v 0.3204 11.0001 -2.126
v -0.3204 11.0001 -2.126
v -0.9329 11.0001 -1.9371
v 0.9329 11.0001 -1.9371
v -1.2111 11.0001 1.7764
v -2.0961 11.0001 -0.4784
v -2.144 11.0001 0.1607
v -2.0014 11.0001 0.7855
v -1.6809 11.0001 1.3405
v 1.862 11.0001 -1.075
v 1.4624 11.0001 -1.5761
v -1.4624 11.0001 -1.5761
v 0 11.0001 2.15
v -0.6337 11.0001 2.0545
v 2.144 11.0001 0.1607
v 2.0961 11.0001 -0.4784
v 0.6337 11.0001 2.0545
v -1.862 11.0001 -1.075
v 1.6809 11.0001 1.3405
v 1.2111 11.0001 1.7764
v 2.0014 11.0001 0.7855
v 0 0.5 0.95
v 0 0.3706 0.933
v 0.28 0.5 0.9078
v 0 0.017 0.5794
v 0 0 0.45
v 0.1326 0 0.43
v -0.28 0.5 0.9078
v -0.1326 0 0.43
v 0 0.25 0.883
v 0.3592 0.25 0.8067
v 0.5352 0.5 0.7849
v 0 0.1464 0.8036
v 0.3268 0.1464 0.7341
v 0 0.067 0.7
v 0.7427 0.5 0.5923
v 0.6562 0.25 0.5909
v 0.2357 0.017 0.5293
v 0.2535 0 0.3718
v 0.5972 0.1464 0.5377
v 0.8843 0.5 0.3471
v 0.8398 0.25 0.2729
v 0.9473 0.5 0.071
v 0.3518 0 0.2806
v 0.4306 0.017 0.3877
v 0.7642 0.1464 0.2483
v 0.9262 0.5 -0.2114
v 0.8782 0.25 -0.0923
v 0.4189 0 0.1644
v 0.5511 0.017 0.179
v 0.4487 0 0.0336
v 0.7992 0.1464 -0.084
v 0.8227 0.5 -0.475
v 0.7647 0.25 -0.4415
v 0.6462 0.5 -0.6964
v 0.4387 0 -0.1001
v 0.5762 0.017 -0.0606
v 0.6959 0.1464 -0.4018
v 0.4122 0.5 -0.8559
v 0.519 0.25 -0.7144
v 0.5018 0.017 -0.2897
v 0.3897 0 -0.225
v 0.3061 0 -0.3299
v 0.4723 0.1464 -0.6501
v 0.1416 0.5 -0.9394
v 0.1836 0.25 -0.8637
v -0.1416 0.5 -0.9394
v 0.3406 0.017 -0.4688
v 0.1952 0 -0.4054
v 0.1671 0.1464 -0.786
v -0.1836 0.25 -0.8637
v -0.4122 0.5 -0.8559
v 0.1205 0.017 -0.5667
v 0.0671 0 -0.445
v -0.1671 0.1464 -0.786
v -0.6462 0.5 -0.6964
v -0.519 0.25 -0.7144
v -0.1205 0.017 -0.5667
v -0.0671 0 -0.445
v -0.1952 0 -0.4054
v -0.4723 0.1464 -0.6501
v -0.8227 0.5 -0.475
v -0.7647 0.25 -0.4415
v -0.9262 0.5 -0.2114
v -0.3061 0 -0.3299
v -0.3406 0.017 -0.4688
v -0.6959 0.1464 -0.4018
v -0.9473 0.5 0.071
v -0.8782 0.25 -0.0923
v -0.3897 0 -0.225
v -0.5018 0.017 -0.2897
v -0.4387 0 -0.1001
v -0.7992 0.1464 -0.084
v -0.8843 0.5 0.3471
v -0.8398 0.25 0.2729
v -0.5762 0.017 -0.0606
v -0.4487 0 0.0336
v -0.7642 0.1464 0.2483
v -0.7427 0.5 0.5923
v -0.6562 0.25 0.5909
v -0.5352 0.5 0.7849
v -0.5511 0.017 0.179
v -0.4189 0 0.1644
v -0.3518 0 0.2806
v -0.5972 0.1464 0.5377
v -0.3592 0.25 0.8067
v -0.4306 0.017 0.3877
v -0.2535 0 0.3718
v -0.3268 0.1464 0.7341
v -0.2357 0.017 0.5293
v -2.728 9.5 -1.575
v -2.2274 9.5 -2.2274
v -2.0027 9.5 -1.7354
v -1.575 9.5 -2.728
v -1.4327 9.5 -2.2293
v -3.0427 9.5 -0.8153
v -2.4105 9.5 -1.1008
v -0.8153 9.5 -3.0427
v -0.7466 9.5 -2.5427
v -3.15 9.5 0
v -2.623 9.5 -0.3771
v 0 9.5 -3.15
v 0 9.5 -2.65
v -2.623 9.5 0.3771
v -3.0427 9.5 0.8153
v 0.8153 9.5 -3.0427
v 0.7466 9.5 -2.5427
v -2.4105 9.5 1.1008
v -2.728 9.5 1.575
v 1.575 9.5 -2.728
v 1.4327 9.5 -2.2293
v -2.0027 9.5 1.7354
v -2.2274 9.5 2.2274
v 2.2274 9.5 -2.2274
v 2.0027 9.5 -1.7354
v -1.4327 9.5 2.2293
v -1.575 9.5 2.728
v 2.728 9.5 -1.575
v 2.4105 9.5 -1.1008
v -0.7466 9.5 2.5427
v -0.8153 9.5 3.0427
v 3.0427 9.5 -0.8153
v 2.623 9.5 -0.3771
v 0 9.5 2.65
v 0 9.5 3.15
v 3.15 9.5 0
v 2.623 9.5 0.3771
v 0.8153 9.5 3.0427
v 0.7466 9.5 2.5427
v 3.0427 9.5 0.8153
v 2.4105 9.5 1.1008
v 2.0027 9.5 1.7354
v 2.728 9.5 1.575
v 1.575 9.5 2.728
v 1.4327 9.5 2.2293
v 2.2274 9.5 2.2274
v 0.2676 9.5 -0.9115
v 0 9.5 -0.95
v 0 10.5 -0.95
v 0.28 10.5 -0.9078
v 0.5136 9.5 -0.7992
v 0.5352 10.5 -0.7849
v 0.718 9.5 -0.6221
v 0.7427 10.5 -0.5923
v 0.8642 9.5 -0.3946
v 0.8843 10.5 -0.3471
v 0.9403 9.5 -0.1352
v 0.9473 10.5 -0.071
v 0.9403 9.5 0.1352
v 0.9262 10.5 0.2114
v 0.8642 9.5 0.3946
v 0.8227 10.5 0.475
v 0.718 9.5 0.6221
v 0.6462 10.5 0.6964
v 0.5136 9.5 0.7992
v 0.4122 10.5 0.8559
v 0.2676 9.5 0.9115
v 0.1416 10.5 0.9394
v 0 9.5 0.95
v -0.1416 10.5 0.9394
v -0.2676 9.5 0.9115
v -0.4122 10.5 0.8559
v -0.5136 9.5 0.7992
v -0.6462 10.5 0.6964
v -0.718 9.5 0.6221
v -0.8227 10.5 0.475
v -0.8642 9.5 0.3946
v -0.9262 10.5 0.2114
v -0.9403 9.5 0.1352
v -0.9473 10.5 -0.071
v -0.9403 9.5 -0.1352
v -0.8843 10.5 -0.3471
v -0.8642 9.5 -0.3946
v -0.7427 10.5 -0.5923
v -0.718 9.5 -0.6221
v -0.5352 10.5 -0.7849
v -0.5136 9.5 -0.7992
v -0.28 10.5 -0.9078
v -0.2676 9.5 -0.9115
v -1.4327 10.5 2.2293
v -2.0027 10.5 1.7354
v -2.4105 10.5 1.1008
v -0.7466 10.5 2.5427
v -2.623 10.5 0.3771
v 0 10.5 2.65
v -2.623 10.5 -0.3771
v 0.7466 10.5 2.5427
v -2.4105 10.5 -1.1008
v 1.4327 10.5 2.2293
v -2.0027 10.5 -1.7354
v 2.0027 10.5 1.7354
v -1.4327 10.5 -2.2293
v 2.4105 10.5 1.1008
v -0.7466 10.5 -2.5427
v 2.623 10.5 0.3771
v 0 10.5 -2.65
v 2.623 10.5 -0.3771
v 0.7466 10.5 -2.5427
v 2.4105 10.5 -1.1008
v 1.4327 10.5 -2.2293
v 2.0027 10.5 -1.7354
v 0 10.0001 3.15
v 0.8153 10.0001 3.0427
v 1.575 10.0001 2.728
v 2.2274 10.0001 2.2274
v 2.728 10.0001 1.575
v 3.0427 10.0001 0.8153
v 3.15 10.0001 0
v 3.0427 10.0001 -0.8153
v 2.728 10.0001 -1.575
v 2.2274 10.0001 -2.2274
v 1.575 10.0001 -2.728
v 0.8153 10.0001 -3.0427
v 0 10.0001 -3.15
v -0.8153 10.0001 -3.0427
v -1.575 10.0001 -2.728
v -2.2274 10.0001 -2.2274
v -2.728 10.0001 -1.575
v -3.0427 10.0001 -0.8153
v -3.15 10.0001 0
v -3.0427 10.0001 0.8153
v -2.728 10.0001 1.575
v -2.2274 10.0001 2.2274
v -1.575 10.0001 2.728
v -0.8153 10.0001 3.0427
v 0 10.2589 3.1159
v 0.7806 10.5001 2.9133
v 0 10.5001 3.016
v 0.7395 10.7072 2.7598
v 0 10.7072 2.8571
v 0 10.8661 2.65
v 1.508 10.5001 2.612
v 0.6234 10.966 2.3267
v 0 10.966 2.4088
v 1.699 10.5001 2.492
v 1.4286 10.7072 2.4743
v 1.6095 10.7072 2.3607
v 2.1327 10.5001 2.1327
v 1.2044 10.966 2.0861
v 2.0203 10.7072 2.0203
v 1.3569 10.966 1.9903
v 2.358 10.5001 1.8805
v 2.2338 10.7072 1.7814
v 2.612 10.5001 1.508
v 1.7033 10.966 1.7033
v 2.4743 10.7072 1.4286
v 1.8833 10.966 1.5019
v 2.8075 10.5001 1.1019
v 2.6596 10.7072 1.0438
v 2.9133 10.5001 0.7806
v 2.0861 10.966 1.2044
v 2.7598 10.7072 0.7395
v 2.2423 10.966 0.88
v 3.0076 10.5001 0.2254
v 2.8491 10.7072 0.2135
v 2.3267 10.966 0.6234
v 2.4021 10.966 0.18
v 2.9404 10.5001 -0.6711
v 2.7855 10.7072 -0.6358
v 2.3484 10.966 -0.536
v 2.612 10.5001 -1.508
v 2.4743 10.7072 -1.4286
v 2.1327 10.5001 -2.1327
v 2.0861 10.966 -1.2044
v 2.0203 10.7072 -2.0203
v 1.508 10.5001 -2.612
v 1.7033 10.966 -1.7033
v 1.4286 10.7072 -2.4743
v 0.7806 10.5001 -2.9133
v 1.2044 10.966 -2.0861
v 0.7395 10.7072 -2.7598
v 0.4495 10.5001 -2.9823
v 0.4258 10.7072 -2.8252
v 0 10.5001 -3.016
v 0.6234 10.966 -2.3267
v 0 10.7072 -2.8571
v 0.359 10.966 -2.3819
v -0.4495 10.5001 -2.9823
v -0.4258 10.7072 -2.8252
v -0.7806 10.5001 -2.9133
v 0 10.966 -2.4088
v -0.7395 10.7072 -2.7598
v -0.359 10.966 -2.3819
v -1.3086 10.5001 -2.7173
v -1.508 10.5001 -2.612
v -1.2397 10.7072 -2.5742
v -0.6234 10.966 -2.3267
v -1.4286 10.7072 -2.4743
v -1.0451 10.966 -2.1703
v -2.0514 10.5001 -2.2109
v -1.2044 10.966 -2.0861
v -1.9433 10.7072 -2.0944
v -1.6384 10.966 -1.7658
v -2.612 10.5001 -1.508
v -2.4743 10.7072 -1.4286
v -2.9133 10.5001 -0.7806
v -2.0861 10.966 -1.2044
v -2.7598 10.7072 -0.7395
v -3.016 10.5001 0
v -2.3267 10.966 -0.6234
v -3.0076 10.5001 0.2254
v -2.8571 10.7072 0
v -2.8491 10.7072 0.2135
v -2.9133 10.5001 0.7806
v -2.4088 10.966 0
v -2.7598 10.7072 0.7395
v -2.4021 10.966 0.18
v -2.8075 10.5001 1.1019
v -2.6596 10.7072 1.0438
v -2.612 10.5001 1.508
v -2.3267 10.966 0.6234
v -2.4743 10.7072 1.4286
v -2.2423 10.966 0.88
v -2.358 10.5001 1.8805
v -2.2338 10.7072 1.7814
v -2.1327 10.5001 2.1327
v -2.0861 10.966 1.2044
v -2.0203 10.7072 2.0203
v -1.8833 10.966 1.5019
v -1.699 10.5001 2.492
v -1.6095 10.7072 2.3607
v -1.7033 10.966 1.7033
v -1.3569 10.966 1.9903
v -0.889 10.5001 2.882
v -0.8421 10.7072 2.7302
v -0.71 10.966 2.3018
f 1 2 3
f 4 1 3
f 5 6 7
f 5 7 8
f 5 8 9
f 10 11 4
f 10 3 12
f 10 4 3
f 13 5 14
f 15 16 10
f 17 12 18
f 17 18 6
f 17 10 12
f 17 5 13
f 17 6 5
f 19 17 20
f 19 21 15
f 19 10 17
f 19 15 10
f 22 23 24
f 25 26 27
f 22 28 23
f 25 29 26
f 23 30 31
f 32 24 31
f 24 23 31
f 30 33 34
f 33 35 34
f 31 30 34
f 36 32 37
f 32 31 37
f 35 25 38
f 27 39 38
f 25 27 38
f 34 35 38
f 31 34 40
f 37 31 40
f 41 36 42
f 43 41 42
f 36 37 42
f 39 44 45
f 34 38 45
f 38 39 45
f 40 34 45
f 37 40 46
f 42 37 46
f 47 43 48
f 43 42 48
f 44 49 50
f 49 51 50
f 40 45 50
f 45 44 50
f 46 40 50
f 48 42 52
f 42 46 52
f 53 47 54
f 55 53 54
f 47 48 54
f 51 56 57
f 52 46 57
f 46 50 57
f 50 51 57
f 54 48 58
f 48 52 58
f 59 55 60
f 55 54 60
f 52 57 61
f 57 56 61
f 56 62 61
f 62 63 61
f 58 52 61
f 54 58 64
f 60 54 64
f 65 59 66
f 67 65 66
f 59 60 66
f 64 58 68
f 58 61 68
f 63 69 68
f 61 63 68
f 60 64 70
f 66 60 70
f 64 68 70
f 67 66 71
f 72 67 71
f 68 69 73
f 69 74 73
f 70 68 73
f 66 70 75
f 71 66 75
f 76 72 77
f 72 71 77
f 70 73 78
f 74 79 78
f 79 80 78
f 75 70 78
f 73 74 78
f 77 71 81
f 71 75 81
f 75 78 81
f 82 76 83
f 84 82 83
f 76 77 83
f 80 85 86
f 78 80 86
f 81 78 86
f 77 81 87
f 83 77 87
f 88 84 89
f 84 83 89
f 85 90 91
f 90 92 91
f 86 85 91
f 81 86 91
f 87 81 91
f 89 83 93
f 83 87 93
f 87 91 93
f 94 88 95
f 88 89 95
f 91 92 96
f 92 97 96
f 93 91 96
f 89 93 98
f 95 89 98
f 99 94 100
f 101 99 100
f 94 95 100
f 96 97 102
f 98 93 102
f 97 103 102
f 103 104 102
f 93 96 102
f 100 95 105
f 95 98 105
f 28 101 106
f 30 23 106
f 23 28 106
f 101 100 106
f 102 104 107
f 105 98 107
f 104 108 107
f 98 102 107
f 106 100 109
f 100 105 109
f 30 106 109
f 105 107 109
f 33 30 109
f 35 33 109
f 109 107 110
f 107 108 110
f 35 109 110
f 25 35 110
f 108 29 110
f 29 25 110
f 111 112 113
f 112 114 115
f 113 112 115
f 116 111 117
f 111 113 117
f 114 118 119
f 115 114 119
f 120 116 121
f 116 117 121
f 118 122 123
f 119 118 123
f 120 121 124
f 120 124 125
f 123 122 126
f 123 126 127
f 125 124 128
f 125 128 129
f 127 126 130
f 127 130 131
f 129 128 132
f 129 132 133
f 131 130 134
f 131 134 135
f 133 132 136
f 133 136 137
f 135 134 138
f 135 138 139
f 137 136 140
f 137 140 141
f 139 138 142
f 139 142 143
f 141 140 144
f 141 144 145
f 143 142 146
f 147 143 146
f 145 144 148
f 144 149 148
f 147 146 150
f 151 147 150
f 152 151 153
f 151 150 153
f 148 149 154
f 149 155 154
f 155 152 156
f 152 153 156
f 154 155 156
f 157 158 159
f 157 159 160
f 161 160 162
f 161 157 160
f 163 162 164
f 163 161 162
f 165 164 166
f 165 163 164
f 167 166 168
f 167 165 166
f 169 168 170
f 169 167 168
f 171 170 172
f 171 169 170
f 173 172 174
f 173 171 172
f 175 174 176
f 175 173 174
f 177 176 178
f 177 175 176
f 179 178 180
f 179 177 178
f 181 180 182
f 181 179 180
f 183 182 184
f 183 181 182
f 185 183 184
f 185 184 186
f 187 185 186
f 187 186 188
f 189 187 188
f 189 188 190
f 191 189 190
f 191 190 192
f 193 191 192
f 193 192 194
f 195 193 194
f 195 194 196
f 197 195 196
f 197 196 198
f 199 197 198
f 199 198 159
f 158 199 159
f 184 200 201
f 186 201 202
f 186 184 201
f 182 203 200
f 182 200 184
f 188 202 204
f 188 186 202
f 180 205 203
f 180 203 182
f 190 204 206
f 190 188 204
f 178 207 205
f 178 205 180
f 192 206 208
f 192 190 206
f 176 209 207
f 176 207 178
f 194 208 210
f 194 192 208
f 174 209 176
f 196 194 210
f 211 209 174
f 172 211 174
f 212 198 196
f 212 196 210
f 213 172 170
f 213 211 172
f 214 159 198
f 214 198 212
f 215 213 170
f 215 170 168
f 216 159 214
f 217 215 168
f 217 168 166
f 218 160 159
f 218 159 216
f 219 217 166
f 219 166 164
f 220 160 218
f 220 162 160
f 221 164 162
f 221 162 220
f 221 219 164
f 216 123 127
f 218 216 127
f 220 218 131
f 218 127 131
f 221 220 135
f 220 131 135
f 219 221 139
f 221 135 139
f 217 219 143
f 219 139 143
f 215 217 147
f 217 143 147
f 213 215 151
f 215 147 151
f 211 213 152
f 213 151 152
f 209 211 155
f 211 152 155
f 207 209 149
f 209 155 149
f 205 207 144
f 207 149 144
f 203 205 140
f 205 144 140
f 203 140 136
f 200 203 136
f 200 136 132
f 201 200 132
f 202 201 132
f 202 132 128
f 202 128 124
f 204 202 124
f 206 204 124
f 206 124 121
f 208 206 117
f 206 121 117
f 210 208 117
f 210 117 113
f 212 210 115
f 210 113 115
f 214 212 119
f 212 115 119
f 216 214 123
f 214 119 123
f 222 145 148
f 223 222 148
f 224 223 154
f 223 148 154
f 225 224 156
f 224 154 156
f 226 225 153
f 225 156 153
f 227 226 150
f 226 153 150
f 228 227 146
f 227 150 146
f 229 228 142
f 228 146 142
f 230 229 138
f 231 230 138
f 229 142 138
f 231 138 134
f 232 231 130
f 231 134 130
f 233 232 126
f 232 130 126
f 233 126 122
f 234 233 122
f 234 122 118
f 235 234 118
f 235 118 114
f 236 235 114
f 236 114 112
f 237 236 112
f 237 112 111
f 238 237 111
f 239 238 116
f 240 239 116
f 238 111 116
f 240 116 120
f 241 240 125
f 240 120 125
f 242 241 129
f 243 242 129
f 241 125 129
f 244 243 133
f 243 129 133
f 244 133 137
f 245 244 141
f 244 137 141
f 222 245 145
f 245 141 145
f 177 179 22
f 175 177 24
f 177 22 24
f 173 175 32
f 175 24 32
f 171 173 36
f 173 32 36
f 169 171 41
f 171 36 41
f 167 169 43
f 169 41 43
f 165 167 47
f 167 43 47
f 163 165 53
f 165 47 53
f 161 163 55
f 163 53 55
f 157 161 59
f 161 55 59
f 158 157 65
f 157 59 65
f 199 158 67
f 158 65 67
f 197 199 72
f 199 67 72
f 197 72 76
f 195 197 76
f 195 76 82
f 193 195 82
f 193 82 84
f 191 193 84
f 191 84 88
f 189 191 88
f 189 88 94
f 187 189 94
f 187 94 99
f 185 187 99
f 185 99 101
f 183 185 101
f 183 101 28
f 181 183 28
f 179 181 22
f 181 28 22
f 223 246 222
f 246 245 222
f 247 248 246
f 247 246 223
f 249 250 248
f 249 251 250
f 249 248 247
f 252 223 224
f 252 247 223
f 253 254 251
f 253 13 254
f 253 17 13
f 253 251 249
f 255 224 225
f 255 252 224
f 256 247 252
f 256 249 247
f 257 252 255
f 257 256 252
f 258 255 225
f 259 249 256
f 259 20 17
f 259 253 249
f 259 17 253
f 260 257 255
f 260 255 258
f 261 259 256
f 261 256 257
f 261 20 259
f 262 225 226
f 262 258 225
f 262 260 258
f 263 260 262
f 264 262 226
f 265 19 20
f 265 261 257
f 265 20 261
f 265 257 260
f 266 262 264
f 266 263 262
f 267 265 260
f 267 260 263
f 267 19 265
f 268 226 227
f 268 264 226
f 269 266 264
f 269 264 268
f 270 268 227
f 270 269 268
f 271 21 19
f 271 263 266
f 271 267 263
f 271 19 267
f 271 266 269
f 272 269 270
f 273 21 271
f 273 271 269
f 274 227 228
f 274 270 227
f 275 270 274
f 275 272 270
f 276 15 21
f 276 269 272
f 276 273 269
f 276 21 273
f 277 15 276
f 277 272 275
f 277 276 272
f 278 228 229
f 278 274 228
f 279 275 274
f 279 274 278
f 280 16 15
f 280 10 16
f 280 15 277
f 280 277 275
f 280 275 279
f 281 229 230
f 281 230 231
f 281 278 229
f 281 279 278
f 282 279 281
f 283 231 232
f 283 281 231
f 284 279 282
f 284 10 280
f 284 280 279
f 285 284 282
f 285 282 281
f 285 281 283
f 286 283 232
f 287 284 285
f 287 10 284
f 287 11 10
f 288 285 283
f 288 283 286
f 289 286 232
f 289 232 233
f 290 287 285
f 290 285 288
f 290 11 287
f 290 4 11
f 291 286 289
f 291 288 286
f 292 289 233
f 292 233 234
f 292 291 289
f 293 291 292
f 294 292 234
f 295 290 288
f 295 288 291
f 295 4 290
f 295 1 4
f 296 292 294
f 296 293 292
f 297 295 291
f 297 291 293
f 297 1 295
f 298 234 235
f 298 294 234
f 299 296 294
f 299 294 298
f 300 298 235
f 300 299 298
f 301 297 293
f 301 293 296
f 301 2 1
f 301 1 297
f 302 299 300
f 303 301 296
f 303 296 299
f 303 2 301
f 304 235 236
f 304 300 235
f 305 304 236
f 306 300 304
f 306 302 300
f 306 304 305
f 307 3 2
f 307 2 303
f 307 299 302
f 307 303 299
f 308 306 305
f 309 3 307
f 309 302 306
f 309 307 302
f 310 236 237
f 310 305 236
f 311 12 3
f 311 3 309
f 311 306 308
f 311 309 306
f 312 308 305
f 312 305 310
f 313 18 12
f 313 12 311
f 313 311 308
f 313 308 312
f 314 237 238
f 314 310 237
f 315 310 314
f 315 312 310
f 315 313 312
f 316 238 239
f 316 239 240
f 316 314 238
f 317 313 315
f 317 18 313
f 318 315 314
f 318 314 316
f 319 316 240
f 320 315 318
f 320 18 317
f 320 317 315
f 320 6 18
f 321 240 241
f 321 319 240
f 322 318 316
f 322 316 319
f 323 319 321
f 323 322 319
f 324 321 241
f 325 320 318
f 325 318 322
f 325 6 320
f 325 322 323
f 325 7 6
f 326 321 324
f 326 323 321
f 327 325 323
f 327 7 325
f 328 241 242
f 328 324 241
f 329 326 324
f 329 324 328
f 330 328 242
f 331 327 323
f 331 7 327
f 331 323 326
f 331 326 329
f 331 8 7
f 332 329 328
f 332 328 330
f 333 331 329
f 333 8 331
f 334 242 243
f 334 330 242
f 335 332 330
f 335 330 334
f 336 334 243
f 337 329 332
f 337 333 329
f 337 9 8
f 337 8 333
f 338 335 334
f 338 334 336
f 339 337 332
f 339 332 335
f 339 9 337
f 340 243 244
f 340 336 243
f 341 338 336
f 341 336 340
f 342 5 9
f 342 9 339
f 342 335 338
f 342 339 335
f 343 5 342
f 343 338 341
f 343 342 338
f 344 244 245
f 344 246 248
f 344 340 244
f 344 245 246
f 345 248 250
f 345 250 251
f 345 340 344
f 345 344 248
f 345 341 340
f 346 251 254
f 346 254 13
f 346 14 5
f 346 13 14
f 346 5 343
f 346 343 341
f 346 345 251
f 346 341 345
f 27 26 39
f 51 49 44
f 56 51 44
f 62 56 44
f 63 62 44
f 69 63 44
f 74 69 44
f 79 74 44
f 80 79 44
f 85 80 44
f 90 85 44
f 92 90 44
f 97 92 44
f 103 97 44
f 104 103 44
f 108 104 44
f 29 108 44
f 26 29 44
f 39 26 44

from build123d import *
from build123d.topology import SkipClean

# Parameters (mm, degrees)
CROQUIS1_R                   = 0.95
SALIENTE_EXTRUIR1_DEPTH      = 11
SALIENTE_EXTRUIR2_DEPTH      = 0.0001
SALIENTE_EXTRUIR2_DEPTH_BACK = 1.5
CROQUIS2_R                   = 3.15
REDONDEO3_R                  = 0.5
REDONDEO5_R                  = 1
CROQUIS4_R                   = 2.65
CROQUIS4_R_2                 = 0.95
CORTAR_EXTRUIR4_DEPTH        = 1


with BuildPart() as part:
    # Croquis1 → Saliente-Extruir1 (new body)
    with BuildSketch(Plane(origin=(0, 0, 0), x_dir=(1, 0, 0), z_dir=(0, 1, 0))):
        with Locations(Location((0, 0, 0), (0, 0, 270))):
            Circle(CROQUIS1_R)
    extrude(amount=SALIENTE_EXTRUIR1_DEPTH)

    # Croquis2 → Saliente-Extruir2 (add, two sides: drawn at the far end of the back side and taken through both)
    with BuildSketch(Plane(origin=(0, 11, 0), x_dir=(1, 0, 0), z_dir=(0, 1, 0)).offset(-SALIENTE_EXTRUIR2_DEPTH_BACK)):
        with Locations(Location((0, 0, 0), (0, 0, 270))):
            Circle(CROQUIS2_R)
    extrude(amount=SALIENTE_EXTRUIR2_DEPTH + SALIENTE_EXTRUIR2_DEPTH_BACK)

    # Redondeo3
    redondeo3_edges = [part.edges().sort_by_distance(p)[0] for p in [
        (0, 0, -0.95),
    ]]
    fillet(redondeo3_edges, radius=REDONDEO3_R)

    # Redondeo5
    redondeo5_edges = [part.edges().sort_by_distance(p)[0] for p in [
        (0, 11.0001, -3.15),
    ]]
    fillet(redondeo5_edges, radius=REDONDEO5_R)

    # Croquis4 → Cortar-Extruir4 (cut)
    with SkipClean():  # the faces are left unmerged after this step: merging them gives an invalid solid
        with BuildSketch(Plane(origin=(0, 9.5, 0), x_dir=(-1, 0, 0), z_dir=(0, -1, 0))):
            with Locations(Location((0, 0, 0), (0, 0, 90))):
                Circle(CROQUIS4_R)
            with Locations(Location((0, 0, 0), (0, 0, 90))):
                Circle(CROQUIS4_R_2, mode=Mode.SUBTRACT)
        extrude(amount=-CORTAR_EXTRUIR4_DEPTH, mode=Mode.SUBTRACT)


solid = part.part
